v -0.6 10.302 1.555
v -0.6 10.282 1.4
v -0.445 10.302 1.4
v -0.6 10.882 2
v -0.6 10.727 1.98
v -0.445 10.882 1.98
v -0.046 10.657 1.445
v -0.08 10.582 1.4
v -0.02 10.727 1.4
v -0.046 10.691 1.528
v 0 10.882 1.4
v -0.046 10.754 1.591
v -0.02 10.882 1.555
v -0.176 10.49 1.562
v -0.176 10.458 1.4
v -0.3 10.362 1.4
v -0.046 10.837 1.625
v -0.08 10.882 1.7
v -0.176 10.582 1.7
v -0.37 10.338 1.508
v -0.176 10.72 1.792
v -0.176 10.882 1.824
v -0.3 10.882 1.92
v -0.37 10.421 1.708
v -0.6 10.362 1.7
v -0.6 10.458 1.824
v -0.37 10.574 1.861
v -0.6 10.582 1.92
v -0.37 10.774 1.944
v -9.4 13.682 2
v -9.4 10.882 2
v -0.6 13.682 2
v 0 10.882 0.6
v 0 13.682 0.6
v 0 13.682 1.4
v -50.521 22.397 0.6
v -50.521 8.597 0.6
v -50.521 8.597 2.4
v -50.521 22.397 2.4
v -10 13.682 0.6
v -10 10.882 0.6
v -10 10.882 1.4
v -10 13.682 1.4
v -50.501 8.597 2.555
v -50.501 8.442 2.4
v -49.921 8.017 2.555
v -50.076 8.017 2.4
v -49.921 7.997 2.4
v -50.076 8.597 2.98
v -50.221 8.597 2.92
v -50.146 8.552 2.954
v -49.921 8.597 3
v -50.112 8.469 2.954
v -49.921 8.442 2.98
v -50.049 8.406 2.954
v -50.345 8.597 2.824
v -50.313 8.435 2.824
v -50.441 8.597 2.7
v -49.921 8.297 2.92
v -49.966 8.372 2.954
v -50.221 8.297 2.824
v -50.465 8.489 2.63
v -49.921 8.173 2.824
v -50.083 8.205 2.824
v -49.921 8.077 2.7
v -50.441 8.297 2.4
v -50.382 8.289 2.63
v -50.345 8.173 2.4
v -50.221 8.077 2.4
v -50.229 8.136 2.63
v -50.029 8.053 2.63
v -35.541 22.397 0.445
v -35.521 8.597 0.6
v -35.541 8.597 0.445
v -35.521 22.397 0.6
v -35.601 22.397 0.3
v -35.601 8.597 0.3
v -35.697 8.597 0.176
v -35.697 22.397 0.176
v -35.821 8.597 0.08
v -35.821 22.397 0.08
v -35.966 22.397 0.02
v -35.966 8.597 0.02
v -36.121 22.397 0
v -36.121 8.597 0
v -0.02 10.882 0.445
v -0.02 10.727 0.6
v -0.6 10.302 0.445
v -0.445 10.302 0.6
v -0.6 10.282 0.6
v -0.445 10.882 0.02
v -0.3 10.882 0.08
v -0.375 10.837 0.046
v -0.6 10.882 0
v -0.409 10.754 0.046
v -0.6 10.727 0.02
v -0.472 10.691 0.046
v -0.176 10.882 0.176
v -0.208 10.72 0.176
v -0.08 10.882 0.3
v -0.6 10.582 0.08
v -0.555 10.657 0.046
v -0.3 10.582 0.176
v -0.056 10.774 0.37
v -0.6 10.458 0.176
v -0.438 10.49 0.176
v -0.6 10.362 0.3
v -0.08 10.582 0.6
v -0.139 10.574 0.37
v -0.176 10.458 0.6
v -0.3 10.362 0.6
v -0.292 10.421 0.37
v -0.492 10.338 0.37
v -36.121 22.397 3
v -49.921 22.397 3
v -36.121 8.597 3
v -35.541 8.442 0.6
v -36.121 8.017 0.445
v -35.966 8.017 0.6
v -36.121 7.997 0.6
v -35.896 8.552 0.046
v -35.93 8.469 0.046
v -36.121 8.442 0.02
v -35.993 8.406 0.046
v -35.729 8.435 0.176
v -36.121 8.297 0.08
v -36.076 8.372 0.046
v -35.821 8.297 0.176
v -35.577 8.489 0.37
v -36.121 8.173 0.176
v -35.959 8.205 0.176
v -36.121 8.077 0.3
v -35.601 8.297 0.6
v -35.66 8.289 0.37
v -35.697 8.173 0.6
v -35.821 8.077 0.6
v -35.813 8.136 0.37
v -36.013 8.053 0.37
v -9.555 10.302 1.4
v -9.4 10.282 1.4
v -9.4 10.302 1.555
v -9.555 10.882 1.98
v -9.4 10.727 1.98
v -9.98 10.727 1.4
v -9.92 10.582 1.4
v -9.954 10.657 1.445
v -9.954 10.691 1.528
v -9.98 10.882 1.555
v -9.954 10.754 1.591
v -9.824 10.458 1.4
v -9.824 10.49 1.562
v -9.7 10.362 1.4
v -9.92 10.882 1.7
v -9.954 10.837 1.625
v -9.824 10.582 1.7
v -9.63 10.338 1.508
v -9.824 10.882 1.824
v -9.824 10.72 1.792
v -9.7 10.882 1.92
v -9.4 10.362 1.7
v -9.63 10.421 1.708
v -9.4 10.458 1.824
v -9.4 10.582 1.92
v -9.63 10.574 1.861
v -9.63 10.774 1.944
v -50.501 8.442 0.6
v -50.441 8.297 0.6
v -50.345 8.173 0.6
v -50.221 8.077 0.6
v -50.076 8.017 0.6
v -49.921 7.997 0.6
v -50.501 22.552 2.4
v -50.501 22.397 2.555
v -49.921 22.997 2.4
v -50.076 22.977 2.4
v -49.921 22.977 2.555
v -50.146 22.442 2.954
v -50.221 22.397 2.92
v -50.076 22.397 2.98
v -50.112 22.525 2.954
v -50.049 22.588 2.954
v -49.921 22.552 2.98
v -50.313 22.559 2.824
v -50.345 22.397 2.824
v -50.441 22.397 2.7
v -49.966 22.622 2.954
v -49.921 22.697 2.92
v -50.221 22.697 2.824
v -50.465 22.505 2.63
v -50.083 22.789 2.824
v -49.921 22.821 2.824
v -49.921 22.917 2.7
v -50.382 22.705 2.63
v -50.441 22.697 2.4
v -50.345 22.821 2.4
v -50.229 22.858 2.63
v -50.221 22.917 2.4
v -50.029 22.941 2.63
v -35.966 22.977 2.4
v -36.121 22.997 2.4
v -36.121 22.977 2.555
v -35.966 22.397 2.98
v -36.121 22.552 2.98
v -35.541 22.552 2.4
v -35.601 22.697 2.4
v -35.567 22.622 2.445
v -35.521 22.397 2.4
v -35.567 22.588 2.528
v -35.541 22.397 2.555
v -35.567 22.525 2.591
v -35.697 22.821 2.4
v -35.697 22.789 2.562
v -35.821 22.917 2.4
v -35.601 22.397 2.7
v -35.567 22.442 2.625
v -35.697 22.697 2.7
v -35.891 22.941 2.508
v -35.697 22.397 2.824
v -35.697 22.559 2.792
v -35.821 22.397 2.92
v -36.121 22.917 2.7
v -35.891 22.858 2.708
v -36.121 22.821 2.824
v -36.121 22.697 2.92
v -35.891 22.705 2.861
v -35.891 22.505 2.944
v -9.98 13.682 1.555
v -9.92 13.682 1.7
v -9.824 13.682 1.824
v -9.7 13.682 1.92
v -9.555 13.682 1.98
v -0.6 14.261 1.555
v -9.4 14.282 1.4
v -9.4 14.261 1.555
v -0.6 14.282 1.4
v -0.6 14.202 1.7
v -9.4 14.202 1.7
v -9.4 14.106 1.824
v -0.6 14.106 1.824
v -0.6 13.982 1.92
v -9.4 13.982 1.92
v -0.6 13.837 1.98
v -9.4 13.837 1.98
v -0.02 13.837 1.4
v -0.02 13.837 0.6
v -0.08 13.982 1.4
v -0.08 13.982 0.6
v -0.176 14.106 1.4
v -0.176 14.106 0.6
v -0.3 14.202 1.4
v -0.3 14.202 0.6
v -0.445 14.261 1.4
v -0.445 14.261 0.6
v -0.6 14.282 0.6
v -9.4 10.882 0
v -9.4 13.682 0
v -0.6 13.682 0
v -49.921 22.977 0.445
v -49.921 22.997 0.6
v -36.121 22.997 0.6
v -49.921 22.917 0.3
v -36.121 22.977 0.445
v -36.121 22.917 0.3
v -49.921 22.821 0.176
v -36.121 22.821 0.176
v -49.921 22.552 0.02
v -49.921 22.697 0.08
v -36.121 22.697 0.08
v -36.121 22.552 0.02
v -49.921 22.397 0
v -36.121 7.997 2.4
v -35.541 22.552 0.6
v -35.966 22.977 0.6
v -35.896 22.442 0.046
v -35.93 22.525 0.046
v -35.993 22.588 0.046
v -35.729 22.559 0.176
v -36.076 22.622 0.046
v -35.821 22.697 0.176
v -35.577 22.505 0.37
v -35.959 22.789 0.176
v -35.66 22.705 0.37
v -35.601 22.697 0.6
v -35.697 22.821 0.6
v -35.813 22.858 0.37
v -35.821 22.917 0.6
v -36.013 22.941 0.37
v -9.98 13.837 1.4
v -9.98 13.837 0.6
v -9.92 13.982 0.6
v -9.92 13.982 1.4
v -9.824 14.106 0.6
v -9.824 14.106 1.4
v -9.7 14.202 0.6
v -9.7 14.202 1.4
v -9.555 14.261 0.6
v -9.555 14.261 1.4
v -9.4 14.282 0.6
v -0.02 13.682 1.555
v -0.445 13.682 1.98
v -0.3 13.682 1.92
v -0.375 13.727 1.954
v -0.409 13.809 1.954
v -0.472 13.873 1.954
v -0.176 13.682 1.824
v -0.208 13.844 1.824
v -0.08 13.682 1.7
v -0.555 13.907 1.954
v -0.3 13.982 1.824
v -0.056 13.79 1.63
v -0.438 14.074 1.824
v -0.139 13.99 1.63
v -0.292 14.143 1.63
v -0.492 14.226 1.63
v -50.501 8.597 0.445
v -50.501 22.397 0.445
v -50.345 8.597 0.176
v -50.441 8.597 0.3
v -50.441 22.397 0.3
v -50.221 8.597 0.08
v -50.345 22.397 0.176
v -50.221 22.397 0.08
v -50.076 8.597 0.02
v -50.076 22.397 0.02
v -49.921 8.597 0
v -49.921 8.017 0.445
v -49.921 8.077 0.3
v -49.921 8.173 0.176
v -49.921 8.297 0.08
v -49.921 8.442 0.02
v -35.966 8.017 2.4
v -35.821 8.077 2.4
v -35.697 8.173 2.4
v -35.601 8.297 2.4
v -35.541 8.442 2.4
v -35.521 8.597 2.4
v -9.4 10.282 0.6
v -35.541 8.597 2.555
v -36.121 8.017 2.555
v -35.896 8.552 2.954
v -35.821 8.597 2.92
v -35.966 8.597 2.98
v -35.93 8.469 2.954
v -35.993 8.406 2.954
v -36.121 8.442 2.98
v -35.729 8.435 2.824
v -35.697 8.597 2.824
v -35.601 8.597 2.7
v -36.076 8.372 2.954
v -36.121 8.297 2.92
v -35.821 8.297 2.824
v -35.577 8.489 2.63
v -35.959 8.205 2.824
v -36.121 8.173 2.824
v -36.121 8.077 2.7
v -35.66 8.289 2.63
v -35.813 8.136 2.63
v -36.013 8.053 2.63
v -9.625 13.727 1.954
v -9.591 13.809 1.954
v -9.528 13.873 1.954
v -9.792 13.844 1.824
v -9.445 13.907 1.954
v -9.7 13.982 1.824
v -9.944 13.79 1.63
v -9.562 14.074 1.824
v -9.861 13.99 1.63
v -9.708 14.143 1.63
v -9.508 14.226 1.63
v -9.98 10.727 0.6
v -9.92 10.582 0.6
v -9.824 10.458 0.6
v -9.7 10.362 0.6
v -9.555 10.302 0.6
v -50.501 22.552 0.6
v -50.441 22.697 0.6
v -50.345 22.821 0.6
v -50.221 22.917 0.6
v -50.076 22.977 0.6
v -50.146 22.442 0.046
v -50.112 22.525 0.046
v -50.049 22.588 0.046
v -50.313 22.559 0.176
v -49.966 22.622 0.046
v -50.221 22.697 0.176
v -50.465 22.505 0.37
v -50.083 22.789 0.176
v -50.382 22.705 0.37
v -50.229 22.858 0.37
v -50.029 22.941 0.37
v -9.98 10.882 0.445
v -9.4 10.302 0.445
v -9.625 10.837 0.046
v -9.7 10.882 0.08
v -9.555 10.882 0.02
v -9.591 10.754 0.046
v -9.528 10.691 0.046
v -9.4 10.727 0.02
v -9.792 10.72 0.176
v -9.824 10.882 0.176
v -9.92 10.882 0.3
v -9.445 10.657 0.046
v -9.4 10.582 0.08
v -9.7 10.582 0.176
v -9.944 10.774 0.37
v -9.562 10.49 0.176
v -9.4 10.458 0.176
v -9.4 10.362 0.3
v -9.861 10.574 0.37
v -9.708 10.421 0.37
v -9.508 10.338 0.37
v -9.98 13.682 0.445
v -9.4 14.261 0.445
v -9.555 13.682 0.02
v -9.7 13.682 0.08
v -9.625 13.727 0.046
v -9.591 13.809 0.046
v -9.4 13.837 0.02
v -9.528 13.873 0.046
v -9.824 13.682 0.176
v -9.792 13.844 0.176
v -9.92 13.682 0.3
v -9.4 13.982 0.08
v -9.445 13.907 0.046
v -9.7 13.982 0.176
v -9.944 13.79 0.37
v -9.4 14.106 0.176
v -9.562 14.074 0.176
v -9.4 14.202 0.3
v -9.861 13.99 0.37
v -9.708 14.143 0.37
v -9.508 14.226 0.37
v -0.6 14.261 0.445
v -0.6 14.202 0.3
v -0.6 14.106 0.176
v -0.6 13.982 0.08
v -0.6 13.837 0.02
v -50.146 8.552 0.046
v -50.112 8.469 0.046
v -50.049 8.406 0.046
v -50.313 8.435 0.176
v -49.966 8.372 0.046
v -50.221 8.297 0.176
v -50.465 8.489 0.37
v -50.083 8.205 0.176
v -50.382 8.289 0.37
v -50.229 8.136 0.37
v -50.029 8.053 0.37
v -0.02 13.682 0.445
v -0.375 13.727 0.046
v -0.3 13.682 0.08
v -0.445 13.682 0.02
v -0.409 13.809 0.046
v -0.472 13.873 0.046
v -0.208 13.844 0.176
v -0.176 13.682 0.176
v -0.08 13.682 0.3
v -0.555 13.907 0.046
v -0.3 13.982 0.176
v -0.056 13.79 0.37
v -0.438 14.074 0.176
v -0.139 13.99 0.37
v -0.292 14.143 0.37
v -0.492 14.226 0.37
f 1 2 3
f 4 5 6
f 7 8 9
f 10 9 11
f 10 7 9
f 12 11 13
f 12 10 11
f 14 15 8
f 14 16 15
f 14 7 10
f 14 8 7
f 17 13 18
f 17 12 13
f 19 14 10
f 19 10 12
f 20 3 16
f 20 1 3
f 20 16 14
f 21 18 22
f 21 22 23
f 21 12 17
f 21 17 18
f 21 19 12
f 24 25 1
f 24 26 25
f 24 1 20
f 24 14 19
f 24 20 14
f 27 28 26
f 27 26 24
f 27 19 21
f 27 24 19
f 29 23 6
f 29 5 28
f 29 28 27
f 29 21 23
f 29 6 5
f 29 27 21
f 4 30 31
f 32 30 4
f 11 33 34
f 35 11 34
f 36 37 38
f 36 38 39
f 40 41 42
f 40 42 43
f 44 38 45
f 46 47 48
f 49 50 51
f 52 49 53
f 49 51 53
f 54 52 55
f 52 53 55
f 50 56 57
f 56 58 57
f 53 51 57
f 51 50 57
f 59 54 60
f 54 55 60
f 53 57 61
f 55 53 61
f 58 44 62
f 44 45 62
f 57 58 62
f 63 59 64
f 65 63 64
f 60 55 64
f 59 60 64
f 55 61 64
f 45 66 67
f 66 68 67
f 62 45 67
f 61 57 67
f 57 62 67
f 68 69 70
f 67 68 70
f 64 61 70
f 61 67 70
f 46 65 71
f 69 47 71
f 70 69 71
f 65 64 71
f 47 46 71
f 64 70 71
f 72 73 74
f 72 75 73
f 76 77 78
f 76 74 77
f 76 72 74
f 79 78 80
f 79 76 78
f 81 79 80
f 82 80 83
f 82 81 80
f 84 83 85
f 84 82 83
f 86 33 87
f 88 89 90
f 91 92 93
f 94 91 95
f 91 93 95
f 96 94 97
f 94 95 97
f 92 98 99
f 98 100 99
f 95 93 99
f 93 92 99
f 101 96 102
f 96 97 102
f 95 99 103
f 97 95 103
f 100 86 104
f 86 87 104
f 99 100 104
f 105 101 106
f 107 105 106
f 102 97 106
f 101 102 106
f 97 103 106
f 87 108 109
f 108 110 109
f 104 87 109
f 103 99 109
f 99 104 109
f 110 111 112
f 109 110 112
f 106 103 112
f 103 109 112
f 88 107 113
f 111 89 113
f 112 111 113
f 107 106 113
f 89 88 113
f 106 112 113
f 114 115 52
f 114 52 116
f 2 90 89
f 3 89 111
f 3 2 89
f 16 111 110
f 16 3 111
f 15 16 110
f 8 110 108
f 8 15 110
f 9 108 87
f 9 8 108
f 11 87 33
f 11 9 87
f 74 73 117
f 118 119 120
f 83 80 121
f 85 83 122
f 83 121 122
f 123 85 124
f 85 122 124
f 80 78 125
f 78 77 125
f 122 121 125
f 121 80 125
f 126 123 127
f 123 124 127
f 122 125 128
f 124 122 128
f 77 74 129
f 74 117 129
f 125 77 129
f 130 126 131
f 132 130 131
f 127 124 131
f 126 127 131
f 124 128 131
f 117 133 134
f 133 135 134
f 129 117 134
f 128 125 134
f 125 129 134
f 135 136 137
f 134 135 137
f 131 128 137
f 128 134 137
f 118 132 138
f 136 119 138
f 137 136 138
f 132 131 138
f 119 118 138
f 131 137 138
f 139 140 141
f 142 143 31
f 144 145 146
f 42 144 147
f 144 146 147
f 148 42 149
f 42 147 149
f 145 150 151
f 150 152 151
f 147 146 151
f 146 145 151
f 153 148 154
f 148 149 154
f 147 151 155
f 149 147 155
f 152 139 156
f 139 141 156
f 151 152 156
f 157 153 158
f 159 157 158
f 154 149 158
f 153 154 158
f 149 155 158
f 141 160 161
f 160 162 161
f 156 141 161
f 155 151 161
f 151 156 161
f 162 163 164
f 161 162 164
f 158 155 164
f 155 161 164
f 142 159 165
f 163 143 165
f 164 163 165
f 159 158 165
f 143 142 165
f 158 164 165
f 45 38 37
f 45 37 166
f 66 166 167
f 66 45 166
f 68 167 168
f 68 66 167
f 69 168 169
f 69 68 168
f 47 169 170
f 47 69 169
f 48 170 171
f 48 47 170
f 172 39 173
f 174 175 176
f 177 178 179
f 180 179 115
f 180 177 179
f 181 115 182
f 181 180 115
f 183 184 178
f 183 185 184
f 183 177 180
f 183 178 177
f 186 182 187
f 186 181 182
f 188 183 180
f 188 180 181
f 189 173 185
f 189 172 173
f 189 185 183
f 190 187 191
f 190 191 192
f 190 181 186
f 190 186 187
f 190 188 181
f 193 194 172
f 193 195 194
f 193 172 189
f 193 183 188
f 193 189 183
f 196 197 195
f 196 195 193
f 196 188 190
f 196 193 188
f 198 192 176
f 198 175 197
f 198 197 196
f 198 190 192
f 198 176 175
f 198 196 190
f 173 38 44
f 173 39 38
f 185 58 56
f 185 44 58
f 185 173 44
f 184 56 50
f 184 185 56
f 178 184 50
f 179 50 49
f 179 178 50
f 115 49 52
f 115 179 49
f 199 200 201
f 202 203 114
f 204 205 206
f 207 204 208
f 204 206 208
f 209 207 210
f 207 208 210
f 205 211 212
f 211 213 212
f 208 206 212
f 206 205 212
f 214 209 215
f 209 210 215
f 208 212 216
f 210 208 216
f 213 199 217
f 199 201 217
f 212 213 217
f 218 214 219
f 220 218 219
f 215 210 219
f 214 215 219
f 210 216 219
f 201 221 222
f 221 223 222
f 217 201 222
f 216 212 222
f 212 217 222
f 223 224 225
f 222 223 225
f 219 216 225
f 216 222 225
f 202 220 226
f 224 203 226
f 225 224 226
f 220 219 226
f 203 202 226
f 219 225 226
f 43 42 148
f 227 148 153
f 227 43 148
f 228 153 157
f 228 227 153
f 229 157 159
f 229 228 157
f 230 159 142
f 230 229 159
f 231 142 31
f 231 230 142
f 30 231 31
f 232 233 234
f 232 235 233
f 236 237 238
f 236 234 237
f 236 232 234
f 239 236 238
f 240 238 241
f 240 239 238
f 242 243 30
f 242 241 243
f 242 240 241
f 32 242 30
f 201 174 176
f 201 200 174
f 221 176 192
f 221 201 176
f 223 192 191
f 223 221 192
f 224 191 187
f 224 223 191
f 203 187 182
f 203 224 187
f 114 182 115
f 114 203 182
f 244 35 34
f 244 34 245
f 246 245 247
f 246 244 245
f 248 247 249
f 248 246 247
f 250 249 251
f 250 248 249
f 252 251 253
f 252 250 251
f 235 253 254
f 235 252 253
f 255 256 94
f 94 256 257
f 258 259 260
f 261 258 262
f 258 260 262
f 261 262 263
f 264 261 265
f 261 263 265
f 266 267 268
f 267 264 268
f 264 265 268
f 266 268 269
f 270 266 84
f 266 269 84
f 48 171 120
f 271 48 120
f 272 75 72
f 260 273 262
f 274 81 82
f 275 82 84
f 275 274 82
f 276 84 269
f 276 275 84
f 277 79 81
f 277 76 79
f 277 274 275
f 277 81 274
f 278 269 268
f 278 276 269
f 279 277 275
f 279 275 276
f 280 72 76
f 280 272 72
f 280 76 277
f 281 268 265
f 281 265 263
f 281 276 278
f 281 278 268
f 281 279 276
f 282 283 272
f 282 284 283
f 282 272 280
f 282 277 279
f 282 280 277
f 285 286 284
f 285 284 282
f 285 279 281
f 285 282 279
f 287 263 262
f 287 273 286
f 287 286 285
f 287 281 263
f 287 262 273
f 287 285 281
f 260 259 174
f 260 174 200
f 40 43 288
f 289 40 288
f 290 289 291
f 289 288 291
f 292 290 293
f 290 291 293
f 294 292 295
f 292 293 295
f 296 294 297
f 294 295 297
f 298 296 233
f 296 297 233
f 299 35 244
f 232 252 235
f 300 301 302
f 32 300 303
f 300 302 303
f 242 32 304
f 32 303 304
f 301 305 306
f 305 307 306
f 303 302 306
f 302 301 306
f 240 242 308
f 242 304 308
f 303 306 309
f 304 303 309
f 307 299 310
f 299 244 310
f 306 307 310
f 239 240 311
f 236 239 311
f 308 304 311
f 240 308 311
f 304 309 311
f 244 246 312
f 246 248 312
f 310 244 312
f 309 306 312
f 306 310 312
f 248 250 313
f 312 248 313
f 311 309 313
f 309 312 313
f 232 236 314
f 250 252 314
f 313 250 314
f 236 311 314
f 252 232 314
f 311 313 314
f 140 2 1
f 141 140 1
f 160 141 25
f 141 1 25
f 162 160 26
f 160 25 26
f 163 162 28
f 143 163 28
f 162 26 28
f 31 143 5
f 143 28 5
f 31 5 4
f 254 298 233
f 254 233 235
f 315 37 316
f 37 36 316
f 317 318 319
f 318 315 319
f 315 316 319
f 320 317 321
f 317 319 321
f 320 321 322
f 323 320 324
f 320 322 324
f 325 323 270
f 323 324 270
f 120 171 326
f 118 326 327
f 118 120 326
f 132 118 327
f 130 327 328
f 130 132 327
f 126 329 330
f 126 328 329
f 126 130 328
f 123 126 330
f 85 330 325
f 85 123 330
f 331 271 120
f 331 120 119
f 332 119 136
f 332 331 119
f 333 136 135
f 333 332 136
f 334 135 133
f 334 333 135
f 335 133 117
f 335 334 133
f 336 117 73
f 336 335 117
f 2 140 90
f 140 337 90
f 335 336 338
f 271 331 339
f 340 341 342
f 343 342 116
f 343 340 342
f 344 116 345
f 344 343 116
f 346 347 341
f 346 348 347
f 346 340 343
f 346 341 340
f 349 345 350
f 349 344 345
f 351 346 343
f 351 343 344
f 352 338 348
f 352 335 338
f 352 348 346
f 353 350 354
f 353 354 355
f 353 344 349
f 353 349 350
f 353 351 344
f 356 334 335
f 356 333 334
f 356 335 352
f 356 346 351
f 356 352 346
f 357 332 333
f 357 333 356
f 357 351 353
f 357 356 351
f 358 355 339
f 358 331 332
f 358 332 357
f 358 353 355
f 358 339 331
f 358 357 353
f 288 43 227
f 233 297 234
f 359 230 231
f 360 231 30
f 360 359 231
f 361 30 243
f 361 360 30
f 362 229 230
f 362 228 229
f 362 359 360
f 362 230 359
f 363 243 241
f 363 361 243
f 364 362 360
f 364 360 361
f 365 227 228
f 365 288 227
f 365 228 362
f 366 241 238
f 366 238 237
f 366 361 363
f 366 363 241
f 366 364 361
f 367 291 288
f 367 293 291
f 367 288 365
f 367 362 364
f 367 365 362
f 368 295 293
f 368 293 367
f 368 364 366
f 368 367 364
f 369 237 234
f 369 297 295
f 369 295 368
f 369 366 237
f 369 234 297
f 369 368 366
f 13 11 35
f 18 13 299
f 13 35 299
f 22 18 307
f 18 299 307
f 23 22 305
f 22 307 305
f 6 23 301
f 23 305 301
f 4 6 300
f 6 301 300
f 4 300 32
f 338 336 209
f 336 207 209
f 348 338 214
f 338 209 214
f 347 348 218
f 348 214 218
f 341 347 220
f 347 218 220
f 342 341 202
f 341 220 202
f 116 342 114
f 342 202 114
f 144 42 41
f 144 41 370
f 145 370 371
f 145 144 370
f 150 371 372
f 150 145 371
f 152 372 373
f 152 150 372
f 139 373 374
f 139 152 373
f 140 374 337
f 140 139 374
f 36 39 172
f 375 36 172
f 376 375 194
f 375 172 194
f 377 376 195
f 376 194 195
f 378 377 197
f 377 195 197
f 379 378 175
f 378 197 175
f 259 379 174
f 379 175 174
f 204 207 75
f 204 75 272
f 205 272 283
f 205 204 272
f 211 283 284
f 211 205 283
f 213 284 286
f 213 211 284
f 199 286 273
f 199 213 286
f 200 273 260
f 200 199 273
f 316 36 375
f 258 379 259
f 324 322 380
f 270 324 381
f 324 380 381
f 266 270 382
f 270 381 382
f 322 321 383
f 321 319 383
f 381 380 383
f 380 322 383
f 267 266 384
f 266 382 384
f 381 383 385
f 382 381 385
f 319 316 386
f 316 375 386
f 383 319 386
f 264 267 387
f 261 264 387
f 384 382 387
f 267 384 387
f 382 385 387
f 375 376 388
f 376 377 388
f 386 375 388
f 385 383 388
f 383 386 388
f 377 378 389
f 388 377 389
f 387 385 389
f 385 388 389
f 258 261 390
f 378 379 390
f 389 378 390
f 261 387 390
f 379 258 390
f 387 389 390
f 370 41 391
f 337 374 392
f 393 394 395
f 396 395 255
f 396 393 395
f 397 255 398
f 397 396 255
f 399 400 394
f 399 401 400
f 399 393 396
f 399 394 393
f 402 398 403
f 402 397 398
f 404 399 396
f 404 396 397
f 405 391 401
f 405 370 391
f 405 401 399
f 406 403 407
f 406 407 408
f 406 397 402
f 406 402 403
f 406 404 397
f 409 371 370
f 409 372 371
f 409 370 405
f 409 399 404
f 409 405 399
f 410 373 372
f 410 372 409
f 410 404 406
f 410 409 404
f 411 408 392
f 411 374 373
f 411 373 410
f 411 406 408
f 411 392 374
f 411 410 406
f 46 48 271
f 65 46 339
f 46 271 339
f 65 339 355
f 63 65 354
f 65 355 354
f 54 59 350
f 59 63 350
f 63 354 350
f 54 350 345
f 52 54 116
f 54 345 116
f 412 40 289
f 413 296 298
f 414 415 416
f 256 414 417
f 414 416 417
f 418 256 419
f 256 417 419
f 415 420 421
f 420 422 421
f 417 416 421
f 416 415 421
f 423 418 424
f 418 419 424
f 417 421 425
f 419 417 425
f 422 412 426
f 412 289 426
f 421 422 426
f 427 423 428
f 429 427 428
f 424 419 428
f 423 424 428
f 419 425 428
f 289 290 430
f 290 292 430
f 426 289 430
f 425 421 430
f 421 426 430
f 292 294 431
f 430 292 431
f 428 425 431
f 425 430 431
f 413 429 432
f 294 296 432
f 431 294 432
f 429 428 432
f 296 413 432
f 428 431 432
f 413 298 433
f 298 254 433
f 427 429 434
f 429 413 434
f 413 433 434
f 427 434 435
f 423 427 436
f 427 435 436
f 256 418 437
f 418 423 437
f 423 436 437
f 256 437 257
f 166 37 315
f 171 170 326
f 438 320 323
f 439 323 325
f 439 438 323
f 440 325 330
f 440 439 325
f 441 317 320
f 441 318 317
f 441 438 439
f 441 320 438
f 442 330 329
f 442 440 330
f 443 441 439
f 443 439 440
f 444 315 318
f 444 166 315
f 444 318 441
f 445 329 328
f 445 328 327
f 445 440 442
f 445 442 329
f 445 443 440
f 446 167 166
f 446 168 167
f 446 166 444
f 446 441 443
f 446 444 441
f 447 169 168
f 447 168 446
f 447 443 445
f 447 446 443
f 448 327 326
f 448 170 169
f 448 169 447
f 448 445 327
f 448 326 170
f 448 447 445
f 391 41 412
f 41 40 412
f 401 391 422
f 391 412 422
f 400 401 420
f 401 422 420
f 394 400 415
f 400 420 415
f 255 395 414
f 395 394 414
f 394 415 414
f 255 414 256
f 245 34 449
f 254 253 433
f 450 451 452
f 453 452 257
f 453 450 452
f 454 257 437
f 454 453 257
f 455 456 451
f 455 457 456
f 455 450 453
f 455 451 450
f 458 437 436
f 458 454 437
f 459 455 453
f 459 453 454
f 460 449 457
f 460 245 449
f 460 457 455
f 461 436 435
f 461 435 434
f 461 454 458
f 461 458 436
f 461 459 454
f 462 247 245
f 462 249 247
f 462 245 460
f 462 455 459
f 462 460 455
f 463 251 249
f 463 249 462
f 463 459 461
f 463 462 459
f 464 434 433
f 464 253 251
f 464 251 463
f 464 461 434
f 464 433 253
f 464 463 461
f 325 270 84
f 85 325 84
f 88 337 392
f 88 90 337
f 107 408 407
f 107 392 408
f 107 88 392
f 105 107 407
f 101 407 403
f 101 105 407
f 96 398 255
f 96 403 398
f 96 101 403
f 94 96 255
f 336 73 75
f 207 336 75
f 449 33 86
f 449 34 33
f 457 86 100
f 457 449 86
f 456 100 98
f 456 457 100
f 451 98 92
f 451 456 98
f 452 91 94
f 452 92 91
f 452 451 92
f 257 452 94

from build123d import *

# Parameters (mm, degrees)
F0_W     = 15
F0_H     = 15
F1_DEPTH = 3
F0_W_2   = 10
F0_H_2   = 4
F2_DEPTH = 2
F3_R     = 0.6
F3_2_R   = 0.6


with BuildPart() as f1:
    # F0 (on Top) → F1 (new body)
    with BuildSketch(Plane.XY):
        with Locations((-43.021046, 15.497045)):
            Rectangle(F0_W, F0_H)
    extrude(amount=F1_DEPTH)

    # F3
    f3_edges = [f1.edges().sort_by_distance(p)[0] for p in [
        (-50.521046, 22.997045, 1.5),
        (-50.521046, 7.997045, 1.5),
        (-50.521046, 15.497045, 0),
        (-50.521046, 15.497045, 3),
        (-43.021046, 22.997045, 3),
        (-35.521046, 7.997045, 1.5),
        (-35.521046, 22.997045, 1.5),
        (-35.521046, 15.497045, 0),
        (-35.521046, 15.497045, 3),
        (-43.021046, 7.997045, 3),
        (-43.021046, 22.997045, 0),
        (-43.021046, 7.997045, 0),
    ]]
    fillet(f3_edges, radius=F3_R)


with BuildPart() as f2:
    # F0 (on Top) → F2 (new body)
    with BuildSketch(Plane.XY):
        with Locations((-5, 12.281917)):
            Rectangle(F0_W_2, F0_H_2)
    extrude(amount=F2_DEPTH)

    # F3#2
    f3_2_edges = [f2.edges().sort_by_distance(p)[0] for p in [
        (-5, 10.281917, 2),
        (0, 10.281917, 1),
        (0, 14.281917, 1),
        (0, 12.281917, 0),
        (0, 12.281917, 2),
        (-10, 14.281917, 1),
        (-10, 10.281917, 1),
        (-10, 12.281917, 0),
        (-10, 12.281917, 2),
        (-5, 14.281917, 2),
        (-5, 14.281917, 0),
        (-5, 10.281917, 0),
    ]]
    fillet(f3_2_edges, radius=F3_2_R)


solid = Compound([f1.part, f2.part])
